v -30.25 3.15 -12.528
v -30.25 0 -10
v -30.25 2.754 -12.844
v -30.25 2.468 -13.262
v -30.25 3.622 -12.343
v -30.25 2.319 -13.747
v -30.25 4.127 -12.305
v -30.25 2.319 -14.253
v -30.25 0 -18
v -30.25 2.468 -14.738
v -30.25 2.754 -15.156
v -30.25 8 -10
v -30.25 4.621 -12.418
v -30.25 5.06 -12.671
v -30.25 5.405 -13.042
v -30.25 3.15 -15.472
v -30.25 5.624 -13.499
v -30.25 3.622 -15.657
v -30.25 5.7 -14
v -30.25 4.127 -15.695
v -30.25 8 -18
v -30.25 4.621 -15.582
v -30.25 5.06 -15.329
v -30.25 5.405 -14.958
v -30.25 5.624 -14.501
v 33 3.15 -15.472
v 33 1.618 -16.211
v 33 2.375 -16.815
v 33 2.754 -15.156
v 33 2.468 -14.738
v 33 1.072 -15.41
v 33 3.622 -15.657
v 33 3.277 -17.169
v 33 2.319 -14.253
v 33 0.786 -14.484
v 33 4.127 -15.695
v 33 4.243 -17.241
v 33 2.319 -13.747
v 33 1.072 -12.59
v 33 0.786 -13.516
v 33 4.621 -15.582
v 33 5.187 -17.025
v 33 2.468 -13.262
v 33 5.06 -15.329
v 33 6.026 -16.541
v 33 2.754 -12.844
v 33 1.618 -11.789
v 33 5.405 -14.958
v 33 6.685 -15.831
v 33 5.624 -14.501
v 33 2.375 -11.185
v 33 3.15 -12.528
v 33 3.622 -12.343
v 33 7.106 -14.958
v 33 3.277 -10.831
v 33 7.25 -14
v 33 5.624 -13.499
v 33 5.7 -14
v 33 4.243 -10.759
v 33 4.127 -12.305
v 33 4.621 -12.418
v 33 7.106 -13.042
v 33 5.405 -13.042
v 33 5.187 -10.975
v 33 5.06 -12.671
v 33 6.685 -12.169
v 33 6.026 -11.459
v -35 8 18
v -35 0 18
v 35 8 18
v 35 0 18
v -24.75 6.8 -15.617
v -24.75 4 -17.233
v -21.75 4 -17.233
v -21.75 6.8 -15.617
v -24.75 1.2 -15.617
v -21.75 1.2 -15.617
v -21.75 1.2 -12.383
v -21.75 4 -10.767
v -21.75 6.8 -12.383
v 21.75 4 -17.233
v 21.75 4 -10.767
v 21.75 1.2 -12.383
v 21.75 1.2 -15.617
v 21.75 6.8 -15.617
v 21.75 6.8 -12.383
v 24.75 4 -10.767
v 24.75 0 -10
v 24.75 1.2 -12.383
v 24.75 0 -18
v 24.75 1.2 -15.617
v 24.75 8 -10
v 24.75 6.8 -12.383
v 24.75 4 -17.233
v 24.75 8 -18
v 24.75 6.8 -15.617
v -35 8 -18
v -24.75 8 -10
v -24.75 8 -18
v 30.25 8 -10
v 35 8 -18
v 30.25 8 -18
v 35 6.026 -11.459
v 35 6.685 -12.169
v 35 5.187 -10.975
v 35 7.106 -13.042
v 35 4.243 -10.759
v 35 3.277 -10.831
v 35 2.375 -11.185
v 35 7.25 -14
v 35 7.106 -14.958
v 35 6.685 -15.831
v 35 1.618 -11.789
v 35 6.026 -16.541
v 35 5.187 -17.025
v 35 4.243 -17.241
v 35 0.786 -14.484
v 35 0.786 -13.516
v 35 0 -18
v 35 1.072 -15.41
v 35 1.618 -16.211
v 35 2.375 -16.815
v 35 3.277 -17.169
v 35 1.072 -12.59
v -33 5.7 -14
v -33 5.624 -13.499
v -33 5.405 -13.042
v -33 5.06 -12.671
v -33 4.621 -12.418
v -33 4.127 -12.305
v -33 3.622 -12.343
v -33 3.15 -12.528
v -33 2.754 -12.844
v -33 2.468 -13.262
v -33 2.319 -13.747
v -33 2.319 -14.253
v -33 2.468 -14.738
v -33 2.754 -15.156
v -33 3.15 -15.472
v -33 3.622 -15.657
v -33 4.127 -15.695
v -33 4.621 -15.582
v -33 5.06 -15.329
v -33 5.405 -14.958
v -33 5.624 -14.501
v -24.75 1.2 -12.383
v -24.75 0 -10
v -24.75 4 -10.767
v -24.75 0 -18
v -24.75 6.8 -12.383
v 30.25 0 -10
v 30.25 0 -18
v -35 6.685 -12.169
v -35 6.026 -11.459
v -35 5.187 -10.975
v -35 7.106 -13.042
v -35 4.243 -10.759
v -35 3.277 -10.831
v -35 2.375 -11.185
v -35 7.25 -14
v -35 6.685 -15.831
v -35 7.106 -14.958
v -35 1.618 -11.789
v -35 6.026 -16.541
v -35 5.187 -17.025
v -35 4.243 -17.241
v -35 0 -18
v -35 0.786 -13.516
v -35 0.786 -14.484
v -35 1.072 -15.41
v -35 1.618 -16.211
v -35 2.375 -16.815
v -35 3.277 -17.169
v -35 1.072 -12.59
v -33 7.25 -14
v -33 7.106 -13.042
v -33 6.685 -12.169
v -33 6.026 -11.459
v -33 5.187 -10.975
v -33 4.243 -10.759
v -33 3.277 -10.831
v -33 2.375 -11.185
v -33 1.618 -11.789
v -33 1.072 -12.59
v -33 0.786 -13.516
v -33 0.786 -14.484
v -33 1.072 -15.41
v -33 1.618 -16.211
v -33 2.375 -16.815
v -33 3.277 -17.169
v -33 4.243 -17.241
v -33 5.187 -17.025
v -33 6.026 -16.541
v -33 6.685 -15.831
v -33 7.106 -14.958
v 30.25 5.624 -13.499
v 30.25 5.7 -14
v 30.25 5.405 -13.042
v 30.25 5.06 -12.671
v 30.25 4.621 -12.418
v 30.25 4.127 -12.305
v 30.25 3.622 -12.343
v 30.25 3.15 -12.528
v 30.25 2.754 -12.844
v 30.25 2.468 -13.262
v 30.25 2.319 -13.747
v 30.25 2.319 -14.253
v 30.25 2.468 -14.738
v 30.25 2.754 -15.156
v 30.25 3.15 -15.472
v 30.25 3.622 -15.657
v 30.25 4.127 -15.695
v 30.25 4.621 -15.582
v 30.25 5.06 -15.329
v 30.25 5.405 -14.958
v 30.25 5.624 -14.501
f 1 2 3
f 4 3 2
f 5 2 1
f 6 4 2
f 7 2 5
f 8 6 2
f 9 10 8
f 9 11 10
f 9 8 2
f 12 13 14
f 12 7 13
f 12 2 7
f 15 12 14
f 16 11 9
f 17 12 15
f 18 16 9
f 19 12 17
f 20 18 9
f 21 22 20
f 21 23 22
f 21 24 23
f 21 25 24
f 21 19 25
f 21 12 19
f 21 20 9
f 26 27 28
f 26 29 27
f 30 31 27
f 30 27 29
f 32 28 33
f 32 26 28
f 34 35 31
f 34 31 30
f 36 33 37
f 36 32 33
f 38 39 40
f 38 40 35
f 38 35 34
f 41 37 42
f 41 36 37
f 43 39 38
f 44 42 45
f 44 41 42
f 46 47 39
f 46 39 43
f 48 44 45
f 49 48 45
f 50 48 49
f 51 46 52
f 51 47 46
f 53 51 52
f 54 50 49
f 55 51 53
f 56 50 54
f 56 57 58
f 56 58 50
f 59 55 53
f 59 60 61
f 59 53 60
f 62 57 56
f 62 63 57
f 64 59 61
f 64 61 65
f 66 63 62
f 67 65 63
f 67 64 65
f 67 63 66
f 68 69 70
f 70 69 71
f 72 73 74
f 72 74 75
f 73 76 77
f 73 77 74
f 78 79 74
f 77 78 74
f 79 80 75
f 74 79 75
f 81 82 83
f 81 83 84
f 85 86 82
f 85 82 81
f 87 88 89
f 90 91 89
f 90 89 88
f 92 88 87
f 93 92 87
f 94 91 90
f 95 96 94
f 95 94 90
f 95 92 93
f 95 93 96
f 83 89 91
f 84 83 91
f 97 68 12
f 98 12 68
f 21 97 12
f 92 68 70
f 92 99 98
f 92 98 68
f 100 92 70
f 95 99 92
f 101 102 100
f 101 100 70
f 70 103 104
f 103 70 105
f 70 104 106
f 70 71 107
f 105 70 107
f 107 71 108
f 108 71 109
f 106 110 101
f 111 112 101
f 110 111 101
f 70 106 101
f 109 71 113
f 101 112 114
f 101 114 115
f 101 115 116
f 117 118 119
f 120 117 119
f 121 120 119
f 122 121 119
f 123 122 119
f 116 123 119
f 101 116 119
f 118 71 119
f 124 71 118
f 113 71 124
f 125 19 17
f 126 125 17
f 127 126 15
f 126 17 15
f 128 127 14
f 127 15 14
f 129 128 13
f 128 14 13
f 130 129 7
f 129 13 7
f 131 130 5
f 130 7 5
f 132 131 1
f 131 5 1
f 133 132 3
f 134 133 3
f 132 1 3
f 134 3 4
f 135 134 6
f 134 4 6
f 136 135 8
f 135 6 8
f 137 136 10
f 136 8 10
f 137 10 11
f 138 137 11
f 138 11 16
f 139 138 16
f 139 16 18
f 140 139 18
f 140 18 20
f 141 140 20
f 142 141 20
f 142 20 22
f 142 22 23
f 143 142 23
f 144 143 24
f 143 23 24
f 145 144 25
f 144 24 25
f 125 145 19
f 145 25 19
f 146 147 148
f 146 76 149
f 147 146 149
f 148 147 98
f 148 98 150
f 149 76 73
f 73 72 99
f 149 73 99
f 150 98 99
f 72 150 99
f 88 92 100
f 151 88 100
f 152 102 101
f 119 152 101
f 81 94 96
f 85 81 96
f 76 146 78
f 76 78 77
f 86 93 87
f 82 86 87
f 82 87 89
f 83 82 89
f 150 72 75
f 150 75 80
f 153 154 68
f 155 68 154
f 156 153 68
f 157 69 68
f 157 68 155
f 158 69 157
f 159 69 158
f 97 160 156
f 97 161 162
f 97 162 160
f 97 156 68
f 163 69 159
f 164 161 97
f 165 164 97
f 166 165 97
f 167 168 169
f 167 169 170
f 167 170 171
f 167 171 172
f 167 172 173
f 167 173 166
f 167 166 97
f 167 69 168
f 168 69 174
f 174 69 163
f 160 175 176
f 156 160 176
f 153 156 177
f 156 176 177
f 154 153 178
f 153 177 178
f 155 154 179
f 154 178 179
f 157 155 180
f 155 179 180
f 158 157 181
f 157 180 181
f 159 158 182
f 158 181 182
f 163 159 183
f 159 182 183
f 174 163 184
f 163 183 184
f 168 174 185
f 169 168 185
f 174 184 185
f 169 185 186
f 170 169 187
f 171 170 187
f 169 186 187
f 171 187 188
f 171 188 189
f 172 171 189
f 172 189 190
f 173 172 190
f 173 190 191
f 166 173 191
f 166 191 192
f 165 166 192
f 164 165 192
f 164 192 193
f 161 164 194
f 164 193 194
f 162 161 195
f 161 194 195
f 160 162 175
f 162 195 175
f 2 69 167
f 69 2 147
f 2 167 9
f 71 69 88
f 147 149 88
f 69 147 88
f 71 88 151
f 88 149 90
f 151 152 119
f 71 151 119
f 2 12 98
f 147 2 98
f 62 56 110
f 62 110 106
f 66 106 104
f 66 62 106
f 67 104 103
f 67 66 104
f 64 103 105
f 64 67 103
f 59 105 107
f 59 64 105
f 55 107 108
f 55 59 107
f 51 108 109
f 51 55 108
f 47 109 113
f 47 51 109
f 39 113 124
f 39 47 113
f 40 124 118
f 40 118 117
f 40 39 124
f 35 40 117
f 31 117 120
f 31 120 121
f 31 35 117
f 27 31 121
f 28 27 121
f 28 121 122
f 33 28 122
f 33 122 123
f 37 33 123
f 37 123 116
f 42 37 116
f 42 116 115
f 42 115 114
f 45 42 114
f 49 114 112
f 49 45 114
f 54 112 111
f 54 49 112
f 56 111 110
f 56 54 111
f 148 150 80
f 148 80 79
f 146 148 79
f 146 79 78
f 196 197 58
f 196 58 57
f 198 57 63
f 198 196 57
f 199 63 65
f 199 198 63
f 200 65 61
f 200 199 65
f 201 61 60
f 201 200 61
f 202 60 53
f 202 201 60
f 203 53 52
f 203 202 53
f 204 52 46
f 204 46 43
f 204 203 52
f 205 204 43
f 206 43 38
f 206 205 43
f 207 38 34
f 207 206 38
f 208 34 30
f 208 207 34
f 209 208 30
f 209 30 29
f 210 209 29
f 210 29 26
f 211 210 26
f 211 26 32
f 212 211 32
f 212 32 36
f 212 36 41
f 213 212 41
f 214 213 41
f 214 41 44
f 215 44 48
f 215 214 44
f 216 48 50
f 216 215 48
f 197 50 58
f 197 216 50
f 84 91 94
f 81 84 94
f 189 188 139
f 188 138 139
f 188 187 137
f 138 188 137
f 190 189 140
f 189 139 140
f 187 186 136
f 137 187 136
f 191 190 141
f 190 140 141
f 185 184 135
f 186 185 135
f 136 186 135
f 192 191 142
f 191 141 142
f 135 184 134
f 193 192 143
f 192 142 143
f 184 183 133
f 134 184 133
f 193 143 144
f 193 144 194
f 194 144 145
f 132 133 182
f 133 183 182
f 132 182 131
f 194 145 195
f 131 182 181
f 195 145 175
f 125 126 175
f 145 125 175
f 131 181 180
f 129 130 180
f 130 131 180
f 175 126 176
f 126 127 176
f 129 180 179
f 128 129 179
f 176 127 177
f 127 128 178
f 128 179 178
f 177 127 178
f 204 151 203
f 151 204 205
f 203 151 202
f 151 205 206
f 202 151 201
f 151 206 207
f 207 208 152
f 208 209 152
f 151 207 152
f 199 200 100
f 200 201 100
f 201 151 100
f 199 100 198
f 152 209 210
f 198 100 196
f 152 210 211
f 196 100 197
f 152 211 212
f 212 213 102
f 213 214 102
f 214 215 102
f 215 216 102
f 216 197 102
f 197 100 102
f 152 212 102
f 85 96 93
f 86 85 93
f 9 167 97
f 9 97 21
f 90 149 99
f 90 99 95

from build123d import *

# Parameters (mm, degrees)
SKETCH1_W                                  = 70
SKETCH1_H                                  = 36
BOSS_EXTRUDE1_DEPTH                        = 8
SKETCH2_W                                  = 5.5
SKETCH2_H                                  = 8
CUT_EXTRUDE1_DEPTH                         = 41.162171256
CBORE_START                                = 33
CBORE_FOR_M3_CHEESE_HEAD_SCREW1_OUTLINE_R  = 3.25
CBORE_FOR_M3_CHEESE_HEAD_SCREW1_DEPTH      = 2
CBORE_START_2                              = 30.25
CBORE_FOR_M3_CHEESE_HEAD_SCREW1_2_OUTLIN_R = 1.7
CBORE_FOR_M3_CHEESE_HEAD_SCREW1_2_DEPTH    = 2.75
CUT_EXTRUDE2_DEPTH                         = 3


# Read off the part's stored shape, not the designer's step: CBORE for M3 Cheese Head Screw1
with BuildPart() as part:
    # Sketch1 → Boss-Extrude1 (new body)
    with BuildSketch(Plane(origin=(0, 0, 0), x_dir=(1, 0, 0), z_dir=(0, 1, 0))):
        Rectangle(SKETCH1_W, SKETCH1_H)
    extrude(amount=BOSS_EXTRUDE1_DEPTH)

    # Sketch2 → Cut-Extrude1 (cut, through all)
    with BuildSketch(Plane(origin=(0, 8, 0), x_dir=(1, 0, 0), z_dir=(0, 1, 0))):
        with Locations((-27.5, 14)):
            Rectangle(SKETCH2_W, SKETCH2_H)
        with Locations((27.5, 14)):
            Rectangle(SKETCH2_W, SKETCH2_H)
    extrude(amount=-CUT_EXTRUDE1_DEPTH, mode=Mode.SUBTRACT)

    # CBORE for M3 Cheese Head Screw1 outline → CBORE for M3 Cheese Head Screw1 (cut)
    with BuildSketch(Plane.YZ.offset(CBORE_START)):
        with Locations((4, -14)):
            Circle(CBORE_FOR_M3_CHEESE_HEAD_SCREW1_OUTLINE_R)
    cbore_for_m3_cheese_head_screw1 = extrude(amount=CBORE_FOR_M3_CHEESE_HEAD_SCREW1_DEPTH, mode=Mode.SUBTRACT)

    # CBORE for M3 Cheese Head Screw1 2 outlin → CBORE for M3 Cheese Head Screw1 2 (cut)
    with BuildSketch(Plane.YZ.offset(CBORE_START_2)):
        with Locations((4, -14)):
            Circle(CBORE_FOR_M3_CHEESE_HEAD_SCREW1_2_OUTLIN_R)
    cbore_for_m3_cheese_head_screw1_2 = extrude(amount=CBORE_FOR_M3_CHEESE_HEAD_SCREW1_2_DEPTH, mode=Mode.SUBTRACT)

    # Sketch9 → Cut-Extrude2 (cut)
    with BuildSketch(Plane(origin=(24.75, 0, 0), x_dir=(0, 0, -1), z_dir=(1, 0, 0))):
        Polygon((15.616580754, 6.8), (12.383419246, 6.8), (10.766838493, 4), (12.383419246, 1.2), (15.616580754, 1.2), (17.233161507, 4), align=None)
    cut_extrude2 = extrude(amount=-CUT_EXTRUDE2_DEPTH, mode=Mode.SUBTRACT)

    # Mirror1: CBORE for M3 Cheese Head Screw1, CBORE for M3 Cheese Head Screw1 2, Cut-Extrude2 across plane
    add(cbore_for_m3_cheese_head_screw1.mirror(Plane(origin=(0, 0, 0), x_dir=(0, 0, 1), z_dir=(1, 0, 0))), mode=Mode.SUBTRACT)
    add(cbore_for_m3_cheese_head_screw1_2.mirror(Plane(origin=(0, 0, 0), x_dir=(0, 0, 1), z_dir=(1, 0, 0))), mode=Mode.SUBTRACT)
    add(cut_extrude2.mirror(Plane(origin=(0, 0, 0), x_dir=(0, 0, 1), z_dir=(1, 0, 0))), mode=Mode.SUBTRACT)


solid = part.part
